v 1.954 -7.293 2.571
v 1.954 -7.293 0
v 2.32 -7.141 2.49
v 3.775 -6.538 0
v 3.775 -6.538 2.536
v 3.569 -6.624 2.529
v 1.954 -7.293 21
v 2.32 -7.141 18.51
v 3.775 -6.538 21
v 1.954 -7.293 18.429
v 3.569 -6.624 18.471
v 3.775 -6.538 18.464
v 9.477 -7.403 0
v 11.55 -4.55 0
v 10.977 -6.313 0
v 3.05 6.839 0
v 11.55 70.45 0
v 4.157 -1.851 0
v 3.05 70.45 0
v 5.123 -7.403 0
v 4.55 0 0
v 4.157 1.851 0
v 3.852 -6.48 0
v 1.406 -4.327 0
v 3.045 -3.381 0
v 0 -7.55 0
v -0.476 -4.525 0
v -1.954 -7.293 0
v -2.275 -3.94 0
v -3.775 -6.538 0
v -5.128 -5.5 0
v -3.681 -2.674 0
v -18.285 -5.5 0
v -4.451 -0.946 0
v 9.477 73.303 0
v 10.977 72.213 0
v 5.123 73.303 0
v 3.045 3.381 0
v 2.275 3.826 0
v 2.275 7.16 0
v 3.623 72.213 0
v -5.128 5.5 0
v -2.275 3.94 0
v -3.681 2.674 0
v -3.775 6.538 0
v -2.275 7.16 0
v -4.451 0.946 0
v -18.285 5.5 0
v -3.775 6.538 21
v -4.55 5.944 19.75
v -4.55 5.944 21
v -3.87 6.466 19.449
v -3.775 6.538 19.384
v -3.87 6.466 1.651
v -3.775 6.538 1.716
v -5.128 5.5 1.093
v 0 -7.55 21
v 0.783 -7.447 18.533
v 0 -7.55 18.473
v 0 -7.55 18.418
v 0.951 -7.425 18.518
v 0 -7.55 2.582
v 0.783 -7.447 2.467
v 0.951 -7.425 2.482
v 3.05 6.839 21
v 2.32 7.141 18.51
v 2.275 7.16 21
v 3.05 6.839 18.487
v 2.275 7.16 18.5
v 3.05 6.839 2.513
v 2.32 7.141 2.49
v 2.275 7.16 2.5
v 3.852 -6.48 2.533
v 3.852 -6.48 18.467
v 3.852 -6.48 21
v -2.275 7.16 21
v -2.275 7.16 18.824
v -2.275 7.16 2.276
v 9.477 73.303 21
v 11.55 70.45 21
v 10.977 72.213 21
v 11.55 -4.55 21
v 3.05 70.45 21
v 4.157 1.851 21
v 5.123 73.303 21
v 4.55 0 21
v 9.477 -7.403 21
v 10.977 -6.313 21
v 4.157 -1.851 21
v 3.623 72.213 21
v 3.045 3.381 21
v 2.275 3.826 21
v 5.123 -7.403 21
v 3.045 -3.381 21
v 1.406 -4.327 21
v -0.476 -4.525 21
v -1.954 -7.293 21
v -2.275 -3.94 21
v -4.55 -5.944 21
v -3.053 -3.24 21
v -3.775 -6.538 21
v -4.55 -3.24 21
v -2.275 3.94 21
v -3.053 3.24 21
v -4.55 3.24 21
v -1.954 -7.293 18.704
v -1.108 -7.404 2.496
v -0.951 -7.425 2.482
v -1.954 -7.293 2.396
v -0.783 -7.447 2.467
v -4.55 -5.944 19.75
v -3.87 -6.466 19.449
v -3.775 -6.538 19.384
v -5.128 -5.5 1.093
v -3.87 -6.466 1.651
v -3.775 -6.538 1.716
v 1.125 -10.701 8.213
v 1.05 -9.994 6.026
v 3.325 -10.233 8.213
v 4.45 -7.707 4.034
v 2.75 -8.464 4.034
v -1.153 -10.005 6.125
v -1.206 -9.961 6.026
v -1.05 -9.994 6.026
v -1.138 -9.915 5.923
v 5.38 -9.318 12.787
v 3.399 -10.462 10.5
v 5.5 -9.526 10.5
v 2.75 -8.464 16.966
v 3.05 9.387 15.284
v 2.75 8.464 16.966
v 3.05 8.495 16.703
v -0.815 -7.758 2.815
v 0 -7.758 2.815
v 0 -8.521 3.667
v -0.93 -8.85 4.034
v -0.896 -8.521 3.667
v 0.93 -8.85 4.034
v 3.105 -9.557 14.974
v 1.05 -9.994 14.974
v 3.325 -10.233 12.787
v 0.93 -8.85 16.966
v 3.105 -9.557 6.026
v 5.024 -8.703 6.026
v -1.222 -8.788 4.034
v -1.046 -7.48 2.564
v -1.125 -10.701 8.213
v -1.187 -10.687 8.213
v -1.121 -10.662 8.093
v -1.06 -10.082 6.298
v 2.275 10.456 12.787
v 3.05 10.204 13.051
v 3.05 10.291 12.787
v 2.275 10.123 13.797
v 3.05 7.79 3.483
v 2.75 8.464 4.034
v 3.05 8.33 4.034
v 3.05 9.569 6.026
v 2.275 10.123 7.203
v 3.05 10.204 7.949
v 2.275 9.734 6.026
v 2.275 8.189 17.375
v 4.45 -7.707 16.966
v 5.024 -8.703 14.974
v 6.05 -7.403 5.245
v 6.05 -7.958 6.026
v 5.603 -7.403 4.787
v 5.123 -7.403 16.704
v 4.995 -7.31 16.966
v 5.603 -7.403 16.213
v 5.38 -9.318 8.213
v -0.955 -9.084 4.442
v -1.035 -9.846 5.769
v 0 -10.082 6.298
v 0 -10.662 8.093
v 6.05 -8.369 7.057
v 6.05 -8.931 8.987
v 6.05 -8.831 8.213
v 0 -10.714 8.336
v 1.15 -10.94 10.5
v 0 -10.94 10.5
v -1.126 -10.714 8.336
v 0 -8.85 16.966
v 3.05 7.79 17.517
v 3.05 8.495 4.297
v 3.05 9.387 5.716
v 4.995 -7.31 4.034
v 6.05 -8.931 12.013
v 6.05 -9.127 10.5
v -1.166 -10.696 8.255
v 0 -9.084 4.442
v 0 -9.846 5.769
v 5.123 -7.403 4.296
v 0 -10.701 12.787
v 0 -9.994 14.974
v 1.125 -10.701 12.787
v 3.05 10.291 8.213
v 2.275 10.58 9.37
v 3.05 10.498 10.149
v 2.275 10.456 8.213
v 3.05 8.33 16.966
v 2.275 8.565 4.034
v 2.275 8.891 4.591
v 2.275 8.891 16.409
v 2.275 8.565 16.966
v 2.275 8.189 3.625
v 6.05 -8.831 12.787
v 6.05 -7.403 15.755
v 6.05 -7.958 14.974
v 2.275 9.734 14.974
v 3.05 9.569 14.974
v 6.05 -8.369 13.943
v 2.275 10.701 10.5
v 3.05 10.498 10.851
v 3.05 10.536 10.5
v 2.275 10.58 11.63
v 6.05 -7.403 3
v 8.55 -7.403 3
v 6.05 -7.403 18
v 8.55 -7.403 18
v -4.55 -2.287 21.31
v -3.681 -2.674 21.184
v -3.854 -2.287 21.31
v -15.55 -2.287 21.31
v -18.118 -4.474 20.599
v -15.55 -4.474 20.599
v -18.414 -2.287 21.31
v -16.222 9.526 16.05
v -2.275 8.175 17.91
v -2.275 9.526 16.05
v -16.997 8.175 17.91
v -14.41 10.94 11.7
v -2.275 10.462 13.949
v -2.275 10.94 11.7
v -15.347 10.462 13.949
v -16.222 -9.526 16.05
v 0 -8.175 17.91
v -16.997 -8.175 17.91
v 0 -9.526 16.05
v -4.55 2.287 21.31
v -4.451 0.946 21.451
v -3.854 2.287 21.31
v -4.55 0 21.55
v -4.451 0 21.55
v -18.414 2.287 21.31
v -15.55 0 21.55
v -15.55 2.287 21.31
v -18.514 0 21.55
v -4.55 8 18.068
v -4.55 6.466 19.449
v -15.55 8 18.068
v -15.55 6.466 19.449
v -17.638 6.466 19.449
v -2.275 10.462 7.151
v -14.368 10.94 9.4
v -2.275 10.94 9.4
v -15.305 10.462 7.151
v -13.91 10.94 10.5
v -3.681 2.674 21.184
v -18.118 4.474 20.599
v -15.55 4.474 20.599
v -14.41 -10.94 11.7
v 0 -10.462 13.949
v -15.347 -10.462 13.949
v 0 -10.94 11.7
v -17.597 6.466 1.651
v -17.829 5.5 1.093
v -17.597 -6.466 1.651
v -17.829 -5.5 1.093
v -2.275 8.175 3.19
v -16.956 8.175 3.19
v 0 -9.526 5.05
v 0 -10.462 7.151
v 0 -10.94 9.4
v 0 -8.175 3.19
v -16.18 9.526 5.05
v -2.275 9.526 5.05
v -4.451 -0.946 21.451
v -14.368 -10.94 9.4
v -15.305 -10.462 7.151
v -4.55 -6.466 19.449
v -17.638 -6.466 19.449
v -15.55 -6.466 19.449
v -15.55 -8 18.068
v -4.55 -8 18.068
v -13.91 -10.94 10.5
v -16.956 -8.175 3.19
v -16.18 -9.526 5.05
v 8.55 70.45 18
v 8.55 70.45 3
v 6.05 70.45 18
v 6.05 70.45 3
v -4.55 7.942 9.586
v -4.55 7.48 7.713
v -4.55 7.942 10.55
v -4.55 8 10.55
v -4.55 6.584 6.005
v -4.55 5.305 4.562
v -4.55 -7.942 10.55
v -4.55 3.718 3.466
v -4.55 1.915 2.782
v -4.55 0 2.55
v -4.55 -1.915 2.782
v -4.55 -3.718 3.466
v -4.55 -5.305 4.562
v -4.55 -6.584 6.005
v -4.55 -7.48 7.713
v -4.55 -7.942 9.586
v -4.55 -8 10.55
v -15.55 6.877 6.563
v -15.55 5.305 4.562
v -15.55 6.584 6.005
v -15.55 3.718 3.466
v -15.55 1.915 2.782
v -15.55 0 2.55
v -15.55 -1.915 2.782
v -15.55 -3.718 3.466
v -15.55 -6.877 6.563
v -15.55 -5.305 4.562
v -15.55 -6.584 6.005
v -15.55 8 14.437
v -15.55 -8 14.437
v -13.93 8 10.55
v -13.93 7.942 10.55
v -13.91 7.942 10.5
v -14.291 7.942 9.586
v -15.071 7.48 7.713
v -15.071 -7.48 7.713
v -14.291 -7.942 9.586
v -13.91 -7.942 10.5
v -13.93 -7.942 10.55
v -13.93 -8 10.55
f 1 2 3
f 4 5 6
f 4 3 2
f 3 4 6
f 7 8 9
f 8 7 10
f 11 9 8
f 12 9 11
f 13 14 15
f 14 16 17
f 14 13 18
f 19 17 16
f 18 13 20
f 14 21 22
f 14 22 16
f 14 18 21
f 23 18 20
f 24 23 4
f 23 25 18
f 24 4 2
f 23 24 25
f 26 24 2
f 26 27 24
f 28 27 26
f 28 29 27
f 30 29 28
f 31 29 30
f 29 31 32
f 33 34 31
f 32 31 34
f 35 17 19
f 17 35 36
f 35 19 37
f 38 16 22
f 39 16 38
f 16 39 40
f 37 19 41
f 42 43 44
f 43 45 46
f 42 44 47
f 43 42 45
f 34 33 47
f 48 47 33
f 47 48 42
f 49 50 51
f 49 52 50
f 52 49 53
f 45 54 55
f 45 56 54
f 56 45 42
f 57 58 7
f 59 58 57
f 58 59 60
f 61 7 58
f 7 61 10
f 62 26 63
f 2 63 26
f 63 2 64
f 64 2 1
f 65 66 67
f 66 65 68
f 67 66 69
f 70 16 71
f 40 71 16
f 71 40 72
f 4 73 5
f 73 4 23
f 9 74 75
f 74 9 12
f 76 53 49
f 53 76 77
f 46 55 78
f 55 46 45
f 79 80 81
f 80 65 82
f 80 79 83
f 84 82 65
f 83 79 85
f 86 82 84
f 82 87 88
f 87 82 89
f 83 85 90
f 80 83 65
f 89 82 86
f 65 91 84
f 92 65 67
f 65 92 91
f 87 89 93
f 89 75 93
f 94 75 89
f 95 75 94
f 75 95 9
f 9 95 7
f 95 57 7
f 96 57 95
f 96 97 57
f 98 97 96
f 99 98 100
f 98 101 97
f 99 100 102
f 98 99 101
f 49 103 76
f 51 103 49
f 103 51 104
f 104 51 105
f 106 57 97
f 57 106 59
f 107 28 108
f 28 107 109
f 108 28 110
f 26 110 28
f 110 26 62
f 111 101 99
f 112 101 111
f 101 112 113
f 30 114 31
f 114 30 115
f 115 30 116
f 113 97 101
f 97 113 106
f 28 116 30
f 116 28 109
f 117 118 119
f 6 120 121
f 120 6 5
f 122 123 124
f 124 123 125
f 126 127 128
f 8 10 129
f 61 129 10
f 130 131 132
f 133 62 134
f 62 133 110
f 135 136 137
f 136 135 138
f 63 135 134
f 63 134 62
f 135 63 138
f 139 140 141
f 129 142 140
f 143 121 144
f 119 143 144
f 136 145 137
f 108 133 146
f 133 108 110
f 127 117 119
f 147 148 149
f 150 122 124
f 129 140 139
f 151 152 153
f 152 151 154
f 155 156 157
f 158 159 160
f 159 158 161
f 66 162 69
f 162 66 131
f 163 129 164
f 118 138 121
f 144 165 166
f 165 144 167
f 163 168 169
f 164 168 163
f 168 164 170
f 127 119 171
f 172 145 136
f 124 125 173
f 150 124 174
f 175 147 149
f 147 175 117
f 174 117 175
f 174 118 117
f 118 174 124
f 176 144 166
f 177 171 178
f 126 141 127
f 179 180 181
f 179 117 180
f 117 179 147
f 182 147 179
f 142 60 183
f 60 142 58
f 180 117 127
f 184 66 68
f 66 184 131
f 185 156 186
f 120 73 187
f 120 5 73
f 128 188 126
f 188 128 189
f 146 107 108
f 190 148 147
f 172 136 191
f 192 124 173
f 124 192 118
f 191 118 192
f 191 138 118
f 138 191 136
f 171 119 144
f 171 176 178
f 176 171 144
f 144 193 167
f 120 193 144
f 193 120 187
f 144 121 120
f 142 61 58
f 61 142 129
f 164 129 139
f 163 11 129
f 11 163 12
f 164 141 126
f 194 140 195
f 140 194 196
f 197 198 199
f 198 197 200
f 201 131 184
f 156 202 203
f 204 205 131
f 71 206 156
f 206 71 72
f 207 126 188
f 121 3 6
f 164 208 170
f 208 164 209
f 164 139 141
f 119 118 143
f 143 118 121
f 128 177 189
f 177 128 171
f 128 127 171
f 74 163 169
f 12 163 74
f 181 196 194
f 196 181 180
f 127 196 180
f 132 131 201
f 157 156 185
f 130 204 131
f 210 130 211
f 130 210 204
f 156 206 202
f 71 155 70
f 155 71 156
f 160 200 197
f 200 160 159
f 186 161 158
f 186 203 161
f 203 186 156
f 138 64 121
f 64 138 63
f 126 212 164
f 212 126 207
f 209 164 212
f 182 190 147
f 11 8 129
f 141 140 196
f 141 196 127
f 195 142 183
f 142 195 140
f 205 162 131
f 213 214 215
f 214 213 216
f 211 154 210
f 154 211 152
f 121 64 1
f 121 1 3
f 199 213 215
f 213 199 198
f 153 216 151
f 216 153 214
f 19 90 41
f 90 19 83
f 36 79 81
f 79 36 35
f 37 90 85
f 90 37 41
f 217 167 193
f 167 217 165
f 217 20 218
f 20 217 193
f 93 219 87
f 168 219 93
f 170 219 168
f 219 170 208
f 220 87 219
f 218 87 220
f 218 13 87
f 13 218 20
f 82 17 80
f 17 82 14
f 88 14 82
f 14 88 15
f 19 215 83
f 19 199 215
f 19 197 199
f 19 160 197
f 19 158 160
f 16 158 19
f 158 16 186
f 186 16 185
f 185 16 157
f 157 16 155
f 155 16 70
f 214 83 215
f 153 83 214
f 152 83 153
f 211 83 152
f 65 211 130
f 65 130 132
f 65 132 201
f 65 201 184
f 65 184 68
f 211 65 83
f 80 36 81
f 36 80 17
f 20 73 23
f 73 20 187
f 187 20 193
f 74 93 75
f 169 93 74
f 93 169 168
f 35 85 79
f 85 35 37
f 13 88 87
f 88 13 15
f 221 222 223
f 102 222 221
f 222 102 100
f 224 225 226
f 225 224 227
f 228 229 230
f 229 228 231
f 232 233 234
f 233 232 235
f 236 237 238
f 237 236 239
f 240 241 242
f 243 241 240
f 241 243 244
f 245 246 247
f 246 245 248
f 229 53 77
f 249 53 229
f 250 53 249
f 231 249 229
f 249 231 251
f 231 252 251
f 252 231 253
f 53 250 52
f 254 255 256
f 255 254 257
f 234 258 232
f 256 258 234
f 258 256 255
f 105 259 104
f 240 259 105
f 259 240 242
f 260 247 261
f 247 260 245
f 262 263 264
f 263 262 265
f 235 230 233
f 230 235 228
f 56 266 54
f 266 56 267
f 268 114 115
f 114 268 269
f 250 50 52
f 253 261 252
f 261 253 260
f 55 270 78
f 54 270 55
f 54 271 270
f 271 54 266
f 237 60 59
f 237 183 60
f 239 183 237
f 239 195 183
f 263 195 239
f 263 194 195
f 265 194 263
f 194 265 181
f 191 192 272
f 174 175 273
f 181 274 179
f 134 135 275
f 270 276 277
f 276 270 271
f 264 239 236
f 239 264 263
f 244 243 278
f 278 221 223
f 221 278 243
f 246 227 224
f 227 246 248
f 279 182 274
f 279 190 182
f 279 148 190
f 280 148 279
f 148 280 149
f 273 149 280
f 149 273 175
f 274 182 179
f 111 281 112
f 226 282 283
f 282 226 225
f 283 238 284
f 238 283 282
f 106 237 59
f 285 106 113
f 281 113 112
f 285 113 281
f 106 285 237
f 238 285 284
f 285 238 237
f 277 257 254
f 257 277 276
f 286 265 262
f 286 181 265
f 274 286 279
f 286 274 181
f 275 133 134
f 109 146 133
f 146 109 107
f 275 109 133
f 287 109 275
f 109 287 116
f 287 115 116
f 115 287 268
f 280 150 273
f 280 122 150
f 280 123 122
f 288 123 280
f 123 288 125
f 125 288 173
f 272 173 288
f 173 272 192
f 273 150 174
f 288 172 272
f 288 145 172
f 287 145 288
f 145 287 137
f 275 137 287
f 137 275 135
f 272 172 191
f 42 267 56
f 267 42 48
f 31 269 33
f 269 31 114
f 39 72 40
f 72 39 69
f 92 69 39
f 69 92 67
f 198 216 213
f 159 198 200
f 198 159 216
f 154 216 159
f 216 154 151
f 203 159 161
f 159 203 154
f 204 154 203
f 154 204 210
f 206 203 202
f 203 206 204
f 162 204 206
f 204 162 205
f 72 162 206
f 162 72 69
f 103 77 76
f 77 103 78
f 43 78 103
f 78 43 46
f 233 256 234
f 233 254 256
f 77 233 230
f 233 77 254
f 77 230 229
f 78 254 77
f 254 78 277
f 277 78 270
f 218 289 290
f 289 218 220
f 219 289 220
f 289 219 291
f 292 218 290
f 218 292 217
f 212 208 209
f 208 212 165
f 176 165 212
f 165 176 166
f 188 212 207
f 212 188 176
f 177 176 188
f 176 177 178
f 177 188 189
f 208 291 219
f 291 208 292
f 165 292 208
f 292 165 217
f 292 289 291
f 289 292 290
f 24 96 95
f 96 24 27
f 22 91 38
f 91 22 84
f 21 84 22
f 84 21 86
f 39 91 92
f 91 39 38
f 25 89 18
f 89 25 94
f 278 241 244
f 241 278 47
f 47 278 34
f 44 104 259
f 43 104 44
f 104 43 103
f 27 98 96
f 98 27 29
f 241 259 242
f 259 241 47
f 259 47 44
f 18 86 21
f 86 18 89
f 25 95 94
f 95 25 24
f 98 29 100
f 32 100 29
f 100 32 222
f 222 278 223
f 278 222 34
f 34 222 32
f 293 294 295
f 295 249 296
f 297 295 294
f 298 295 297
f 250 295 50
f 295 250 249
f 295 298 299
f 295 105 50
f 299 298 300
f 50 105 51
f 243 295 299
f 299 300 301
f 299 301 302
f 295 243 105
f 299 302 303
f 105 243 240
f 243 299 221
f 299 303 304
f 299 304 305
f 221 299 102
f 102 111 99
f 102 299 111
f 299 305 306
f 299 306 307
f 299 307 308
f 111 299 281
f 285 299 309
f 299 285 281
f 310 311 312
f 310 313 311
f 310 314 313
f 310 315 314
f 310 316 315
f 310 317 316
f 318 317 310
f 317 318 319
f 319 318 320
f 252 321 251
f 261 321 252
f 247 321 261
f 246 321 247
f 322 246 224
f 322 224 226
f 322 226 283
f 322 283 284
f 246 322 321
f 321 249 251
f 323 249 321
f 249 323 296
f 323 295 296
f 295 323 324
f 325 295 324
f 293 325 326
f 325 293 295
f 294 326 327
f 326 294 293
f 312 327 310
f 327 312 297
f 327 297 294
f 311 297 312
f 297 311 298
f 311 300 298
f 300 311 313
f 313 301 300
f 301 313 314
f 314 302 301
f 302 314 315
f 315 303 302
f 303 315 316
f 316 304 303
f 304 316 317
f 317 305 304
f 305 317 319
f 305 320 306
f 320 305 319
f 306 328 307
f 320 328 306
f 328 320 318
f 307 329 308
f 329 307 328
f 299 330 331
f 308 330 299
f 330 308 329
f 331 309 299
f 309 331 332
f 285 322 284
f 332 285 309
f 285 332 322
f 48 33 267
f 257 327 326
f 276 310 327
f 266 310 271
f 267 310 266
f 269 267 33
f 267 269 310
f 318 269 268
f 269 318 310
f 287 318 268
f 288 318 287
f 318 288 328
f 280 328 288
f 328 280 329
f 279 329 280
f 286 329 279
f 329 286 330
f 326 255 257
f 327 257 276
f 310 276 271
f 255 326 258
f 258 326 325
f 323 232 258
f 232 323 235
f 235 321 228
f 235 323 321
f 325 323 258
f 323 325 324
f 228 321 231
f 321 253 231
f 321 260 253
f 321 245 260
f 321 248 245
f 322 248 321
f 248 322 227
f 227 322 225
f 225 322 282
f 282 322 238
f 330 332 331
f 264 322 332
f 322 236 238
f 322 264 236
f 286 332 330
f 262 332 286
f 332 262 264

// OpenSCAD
//
//  Copyright (C) 24-04-2013 Jasper den Ouden.(ojasper.nl)
//
//  This is free software: you can redistribute it and/or modify
//  it under the terms of the GNU General Public License as published
//  by the Free Software Foundation, either version 3 of the License, or
//  (at your option) any later version.
//

bw = 15; //Blade width.
bt = 2.5; //Thickness.
bl =75;  //..length

mr = 16/2; //Magnet radius.
mh = 11; //Magnet height.

rr = 9.1/2; //Rod radius.

//tw = 8; //tweezers width.

t = 3; //Thicknesses

module tweezersnknife()
{
    rs = (mr+t)/2;
    difference()
    {   union()
        {   cylinder(r=rr+t,h=bw + 2*t);
            translate([0,0,bw/2+t]) sphere(mr+t);
            translate([rr+t/2,-rr]) linear_extrude(height=bw+2*t) minkowski()
            {   square([bt,bl]);
                circle(t);
            }
            translate([0,0,rr+2*t]) rotate([0,-90,0]) cylinder(r=mr+t, h=rr+t+mh);
            translate([-rr-mh-t,-rs]) cube([mh+2*rr+2*t,2*rs,bw+t]);
        }
        translate([-rr/2,0]) cube([rr,4*rr,2*(bw+t)]);
        
        translate([rr+t/2,-bl-rr,t]) cube([bt,2*bl,bw]);
        cylinder(r=rr,h=2*(bw+t));
        translate([-rr,0,rr+2*t]) rotate([0,-90,0]) linear_extrude(height=mh)
        {   circle(mr);
            translate([mr,0]) square(2*[mr,mr],center=true); 
            //cylinder(r=mr, h=2*(mh+t));
        }
        translate([0,0,-bl]) cube(bl*[2,2,2], center=true);
        translate([-rr-t-mh,0,bw/2+t]) scale([t/mr,1.5,0.9]) rotate([90,0,0])
            rotate(45) cube([2*mr+t/2,2*mr+t/2,2*bw], center=true);
//            cylinder(r= mr, h = 2*bw);
    }
}

tweezersnknife();
